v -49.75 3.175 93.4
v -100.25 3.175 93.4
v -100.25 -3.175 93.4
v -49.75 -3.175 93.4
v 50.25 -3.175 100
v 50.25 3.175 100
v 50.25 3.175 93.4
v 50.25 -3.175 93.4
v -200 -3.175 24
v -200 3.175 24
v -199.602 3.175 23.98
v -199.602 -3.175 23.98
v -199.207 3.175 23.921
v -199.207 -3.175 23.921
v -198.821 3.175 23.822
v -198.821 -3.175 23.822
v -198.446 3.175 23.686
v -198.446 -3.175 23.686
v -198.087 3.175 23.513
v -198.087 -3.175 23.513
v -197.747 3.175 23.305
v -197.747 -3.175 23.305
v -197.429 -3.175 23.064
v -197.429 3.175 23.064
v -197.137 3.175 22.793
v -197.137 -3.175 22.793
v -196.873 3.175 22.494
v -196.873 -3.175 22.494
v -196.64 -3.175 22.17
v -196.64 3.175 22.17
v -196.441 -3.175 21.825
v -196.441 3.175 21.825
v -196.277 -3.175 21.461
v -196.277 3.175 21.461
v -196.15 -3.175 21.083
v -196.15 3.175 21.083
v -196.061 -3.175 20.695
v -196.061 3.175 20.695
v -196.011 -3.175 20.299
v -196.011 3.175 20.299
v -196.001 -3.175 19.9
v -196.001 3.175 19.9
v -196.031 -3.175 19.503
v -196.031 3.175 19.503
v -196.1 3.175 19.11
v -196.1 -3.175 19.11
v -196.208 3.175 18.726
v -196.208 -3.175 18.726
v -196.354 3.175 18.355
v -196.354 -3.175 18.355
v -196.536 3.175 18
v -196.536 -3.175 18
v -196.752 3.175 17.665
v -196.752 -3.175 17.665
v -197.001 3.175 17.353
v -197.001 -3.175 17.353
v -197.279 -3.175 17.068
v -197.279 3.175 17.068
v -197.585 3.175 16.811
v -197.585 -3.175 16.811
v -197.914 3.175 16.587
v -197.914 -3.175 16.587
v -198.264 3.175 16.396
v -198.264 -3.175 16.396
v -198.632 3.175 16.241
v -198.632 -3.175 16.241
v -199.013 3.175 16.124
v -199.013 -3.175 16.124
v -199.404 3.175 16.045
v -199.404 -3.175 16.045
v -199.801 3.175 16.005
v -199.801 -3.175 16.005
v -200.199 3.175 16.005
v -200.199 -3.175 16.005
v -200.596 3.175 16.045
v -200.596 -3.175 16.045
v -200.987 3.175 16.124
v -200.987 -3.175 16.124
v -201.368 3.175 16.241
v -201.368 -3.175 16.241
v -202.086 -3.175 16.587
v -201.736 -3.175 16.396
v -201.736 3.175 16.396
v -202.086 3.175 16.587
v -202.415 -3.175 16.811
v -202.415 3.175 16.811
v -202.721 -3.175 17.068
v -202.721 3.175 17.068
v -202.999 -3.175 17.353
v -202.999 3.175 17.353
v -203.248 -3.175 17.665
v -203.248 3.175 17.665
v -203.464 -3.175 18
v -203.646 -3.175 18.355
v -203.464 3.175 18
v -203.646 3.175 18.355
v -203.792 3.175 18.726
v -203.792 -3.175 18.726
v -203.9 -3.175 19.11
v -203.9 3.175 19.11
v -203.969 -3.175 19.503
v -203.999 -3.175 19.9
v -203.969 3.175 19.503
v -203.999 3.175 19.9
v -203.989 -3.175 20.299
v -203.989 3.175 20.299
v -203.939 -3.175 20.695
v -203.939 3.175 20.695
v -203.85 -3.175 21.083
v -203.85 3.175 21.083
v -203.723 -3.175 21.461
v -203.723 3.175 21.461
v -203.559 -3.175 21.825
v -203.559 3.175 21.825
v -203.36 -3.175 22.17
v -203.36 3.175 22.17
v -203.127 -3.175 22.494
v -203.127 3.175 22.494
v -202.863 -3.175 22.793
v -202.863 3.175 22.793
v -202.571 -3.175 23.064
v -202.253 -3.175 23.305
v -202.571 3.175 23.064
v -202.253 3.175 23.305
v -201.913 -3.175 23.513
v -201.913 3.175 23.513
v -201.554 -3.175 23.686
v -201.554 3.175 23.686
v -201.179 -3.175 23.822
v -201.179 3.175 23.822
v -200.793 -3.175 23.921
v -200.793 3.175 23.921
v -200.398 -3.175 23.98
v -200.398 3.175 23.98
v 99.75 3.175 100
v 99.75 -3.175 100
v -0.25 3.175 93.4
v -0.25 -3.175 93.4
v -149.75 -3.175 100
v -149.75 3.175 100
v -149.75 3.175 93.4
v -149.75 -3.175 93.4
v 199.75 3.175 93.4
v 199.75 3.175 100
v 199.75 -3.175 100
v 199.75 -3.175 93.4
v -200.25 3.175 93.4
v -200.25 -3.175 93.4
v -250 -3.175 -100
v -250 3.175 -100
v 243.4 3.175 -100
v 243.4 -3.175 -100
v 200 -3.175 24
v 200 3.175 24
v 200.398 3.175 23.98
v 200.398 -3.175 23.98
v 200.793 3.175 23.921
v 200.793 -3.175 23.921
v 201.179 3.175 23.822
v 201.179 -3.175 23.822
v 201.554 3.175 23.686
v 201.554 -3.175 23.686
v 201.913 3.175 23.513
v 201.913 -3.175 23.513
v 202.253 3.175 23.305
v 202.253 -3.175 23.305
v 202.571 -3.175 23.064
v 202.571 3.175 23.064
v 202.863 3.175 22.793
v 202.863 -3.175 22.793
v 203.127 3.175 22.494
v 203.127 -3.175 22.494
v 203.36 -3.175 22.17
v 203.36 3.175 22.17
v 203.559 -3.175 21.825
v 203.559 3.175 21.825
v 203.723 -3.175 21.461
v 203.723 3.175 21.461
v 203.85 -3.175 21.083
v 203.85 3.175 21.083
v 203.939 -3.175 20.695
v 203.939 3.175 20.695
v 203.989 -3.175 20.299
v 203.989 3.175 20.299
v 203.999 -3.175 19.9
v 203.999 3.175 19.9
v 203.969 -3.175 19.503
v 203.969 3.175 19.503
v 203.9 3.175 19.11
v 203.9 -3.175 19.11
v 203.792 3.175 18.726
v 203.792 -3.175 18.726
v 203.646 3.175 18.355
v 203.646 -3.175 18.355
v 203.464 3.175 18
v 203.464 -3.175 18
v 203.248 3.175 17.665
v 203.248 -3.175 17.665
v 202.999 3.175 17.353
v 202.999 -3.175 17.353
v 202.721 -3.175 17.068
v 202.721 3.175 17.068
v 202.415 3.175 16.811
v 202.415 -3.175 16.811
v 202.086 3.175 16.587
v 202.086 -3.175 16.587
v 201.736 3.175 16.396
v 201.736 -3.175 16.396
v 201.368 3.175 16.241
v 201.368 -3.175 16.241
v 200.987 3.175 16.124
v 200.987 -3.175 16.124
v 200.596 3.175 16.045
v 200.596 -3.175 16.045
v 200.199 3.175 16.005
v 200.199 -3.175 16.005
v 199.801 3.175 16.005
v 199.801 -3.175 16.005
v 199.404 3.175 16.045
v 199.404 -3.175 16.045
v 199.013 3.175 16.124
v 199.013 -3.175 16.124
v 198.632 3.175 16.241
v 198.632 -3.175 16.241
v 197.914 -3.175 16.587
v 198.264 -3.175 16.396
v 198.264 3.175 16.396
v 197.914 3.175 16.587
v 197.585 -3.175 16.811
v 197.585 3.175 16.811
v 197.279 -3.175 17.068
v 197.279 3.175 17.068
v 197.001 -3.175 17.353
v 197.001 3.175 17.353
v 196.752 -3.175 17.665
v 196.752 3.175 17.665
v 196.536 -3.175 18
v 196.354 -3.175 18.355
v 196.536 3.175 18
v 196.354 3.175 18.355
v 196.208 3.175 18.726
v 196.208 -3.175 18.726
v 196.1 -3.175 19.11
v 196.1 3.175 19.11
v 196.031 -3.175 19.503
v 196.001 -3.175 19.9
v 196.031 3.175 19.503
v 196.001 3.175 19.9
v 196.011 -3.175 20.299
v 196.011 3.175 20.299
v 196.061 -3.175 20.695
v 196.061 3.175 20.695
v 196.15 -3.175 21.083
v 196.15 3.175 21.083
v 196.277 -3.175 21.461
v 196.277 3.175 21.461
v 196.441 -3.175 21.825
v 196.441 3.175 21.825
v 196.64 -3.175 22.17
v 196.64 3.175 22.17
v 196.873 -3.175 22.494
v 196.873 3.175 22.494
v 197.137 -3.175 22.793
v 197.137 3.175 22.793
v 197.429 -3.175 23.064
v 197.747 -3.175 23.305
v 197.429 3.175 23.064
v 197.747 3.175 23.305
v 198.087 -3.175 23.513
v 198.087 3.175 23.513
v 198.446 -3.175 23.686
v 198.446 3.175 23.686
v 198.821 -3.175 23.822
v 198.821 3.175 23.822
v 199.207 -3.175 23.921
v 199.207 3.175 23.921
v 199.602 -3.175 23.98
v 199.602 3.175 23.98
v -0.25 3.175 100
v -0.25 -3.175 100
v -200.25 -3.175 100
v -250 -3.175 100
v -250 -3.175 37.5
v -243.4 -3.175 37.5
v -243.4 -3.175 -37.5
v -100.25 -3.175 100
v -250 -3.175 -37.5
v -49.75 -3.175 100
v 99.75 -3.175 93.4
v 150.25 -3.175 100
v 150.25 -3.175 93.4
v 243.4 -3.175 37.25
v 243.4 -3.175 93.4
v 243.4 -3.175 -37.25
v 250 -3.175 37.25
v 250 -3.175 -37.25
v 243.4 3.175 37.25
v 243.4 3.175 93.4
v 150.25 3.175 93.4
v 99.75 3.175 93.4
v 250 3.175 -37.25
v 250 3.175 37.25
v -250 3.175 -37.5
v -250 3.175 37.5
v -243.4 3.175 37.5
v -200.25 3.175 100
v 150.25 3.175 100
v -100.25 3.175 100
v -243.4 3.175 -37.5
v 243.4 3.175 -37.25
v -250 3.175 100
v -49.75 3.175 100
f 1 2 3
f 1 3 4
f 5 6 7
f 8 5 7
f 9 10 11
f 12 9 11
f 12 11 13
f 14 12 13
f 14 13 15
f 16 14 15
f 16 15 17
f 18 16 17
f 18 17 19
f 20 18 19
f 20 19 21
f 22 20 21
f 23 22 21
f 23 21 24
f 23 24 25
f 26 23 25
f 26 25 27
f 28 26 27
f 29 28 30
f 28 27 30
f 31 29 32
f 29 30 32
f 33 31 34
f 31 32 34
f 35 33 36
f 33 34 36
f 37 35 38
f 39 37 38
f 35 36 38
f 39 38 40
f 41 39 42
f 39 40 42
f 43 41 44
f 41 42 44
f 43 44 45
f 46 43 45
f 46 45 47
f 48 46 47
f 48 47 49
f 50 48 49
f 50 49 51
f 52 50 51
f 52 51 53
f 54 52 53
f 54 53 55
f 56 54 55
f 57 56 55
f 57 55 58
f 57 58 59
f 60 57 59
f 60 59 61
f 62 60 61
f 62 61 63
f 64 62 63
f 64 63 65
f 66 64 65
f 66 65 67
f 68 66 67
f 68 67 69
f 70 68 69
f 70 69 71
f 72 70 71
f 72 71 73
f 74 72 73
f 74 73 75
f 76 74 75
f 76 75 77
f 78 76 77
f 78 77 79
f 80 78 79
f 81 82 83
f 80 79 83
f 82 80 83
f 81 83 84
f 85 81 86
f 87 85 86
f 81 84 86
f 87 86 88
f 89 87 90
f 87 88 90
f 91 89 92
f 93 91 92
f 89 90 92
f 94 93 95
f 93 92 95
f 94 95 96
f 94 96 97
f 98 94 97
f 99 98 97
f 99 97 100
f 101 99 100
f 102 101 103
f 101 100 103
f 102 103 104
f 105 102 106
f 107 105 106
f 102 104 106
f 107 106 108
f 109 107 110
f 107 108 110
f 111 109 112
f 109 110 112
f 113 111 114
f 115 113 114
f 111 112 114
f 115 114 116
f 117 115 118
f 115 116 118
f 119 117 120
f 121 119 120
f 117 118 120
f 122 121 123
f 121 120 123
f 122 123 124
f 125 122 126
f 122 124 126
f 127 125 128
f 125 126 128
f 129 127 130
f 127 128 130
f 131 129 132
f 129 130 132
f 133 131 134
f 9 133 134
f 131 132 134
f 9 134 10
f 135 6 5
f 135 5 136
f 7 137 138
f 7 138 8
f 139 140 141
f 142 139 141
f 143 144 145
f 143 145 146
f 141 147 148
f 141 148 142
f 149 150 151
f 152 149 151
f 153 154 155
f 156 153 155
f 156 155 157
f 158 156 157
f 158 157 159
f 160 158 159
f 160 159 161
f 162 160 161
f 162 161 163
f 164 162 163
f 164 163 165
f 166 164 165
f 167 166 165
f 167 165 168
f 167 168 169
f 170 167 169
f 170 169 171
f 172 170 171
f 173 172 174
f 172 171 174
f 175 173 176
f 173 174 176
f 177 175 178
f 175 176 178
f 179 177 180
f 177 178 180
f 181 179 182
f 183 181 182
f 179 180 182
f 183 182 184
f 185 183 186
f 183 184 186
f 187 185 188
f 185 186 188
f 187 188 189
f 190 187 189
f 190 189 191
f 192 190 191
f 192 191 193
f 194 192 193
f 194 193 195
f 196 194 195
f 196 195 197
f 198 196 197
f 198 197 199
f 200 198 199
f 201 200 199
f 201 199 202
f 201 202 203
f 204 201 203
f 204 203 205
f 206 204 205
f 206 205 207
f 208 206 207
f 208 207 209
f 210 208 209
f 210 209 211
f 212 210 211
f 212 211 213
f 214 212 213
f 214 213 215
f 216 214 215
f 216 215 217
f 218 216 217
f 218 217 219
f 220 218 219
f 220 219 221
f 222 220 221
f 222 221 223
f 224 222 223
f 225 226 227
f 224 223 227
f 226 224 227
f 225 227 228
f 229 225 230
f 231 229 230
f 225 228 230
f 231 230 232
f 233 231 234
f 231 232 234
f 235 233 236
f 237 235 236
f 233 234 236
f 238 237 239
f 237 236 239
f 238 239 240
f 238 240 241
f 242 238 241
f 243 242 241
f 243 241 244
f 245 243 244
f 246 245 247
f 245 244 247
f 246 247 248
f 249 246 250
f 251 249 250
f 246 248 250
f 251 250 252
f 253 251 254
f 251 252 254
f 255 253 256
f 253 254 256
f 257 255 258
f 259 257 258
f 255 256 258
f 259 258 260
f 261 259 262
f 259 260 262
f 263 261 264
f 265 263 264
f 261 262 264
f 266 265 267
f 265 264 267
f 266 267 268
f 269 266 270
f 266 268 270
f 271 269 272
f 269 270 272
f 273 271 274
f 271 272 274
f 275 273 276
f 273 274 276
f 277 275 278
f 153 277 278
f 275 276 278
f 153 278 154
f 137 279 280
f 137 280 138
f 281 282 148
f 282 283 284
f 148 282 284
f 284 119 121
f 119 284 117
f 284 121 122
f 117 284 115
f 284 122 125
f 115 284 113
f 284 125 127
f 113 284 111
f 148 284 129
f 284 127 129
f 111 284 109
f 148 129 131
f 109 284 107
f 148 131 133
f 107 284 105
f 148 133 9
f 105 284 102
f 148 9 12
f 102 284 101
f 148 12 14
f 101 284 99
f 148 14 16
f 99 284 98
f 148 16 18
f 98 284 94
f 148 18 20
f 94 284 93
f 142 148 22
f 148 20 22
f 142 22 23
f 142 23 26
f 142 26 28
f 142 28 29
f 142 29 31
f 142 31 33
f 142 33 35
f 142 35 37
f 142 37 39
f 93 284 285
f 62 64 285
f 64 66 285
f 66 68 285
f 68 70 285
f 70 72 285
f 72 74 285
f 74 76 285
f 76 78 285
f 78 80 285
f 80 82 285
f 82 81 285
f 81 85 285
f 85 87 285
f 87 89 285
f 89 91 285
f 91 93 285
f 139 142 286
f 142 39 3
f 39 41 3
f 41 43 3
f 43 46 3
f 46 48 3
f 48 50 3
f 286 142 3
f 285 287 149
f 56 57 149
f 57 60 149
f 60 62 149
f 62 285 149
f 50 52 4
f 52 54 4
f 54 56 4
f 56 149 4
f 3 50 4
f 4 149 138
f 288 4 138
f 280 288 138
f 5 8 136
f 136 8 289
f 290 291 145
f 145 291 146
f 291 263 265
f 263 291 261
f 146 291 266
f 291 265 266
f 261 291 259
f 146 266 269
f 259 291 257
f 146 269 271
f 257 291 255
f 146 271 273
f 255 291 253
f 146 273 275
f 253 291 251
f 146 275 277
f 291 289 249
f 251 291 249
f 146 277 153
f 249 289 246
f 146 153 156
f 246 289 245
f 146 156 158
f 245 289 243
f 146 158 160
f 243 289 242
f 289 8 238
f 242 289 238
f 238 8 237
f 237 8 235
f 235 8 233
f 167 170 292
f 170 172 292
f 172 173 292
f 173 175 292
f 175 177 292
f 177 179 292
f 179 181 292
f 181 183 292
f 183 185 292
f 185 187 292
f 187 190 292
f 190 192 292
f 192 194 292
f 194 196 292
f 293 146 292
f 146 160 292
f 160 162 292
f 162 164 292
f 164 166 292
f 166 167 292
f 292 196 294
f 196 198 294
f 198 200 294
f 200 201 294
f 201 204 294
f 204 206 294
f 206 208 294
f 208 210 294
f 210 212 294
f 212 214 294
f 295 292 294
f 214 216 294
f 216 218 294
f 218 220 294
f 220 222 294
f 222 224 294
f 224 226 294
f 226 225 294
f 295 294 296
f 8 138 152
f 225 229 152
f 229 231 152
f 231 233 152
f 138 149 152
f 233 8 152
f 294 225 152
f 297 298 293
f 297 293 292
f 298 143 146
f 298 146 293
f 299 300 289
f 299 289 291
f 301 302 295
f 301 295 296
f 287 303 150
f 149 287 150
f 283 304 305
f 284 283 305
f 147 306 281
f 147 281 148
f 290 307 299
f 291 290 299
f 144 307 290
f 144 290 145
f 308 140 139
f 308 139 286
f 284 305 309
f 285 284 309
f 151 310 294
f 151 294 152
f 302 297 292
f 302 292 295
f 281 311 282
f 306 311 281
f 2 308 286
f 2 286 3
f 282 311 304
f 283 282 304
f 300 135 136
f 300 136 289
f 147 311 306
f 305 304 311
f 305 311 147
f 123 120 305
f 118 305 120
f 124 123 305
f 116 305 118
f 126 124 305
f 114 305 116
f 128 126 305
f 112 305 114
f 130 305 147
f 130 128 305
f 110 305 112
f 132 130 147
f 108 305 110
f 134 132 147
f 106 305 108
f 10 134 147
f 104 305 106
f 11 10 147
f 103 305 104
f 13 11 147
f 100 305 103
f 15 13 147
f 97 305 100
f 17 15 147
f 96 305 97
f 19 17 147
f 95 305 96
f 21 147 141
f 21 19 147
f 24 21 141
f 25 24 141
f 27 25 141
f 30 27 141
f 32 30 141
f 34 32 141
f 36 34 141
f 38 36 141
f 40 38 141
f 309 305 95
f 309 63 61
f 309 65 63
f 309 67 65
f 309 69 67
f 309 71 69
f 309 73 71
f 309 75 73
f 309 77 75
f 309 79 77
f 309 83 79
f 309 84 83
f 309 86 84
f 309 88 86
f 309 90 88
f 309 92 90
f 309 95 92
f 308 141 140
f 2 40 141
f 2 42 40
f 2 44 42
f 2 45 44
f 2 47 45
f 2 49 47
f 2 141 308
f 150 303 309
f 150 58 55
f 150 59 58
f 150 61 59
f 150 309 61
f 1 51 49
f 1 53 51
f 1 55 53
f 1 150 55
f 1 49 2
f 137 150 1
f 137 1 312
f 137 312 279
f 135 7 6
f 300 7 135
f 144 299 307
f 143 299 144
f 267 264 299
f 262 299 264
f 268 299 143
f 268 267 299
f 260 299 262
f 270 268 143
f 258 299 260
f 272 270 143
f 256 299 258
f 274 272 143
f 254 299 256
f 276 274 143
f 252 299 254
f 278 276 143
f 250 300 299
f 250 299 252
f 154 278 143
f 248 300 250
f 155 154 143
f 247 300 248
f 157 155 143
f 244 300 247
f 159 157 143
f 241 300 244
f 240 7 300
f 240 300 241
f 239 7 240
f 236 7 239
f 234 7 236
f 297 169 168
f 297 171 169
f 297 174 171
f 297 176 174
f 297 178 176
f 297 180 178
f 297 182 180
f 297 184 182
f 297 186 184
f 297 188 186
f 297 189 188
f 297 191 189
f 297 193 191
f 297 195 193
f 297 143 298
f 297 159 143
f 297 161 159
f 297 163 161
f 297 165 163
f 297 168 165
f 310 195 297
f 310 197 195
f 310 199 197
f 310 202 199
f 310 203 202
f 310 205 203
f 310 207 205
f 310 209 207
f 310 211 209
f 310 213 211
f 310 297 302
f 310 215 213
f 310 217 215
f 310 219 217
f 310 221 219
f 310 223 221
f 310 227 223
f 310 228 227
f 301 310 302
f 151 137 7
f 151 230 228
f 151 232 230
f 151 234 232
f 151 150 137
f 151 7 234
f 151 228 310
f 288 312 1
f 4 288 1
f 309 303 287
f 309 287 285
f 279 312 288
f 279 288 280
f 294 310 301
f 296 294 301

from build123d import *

# Parameters (mm, degrees)
SKETCH1_W           = 500
SKETCH1_H           = 200
BOSS_EXTRUDE1_DEPTH = 3.175
SKETCH2_W           = 50.5
SKETCH2_H           = 6.6
CUT_EXTRUDE1_DEPTH  = 270.333106951
LPATTERN1_COUNT     = 5
LPATTERN1_PITCH     = 100
SKETCH3_W           = 6.6
SKETCH3_H           = 56.15
SKETCH3_H_2         = 62.75
SKETCH3_H_3         = 75
CUT_EXTRUDE2_DEPTH  = 270.333106951
SKETCH4_R           = 4
AXLE_HOLES_DEPTH    = 270.333106951


with BuildPart() as part:
    # Sketch1 → Boss-Extrude1 (new, symmetric)
    with BuildSketch(Plane(origin=(0, 0, 0), x_dir=(1, 0, 0), z_dir=(0, 1, 0))):
        Rectangle(SKETCH1_W, SKETCH1_H)
    extrude(amount=BOSS_EXTRUDE1_DEPTH, both=True)

    # Sketch2 → Cut-Extrude1 (cut, through all)
    with BuildSketch(Plane(origin=(0, 3.175, 0), x_dir=(1, 0, 0), z_dir=(0, 1, 0))):
        with Locations((-175, -96.7)):
            Rectangle(SKETCH2_W, SKETCH2_H)
    cut_extrude1 = extrude(amount=-CUT_EXTRUDE1_DEPTH, mode=Mode.SUBTRACT)

    # LPattern1: Cut-Extrude1 ×5
    with Locations(*[(i * LPATTERN1_PITCH, 0, 0) for i in range(1, LPATTERN1_COUNT)]):
        add(cut_extrude1, mode=Mode.SUBTRACT)

    # Sketch3 → Cut-Extrude2 (cut, through all)
    with BuildSketch(Plane(origin=(0, 3.175, 0), x_dir=(1, 0, 0), z_dir=(0, 1, 0))):
        with Locations((246.7, -65.325)):
            Rectangle(SKETCH3_W, SKETCH3_H)
        with Locations((246.7, 68.625)):
            Rectangle(SKETCH3_W, SKETCH3_H_2)
        with Locations((-246.7, 0)):
            Rectangle(SKETCH3_W, SKETCH3_H_3)
    extrude(amount=-CUT_EXTRUDE2_DEPTH, mode=Mode.SUBTRACT)

    # Sketch4 → Axle Holes (cut, through all)
    with BuildSketch(Plane(origin=(0, 3.175, 0), x_dir=(1, 0, 0), z_dir=(0, 1, 0))):
        with Locations(Location((-200, -20, 0), (0, 0, 270))):
            Circle(SKETCH4_R)
        with Locations(Location((200, -20, 0), (0, 0, 270))):
            Circle(SKETCH4_R)
    extrude(amount=-AXLE_HOLES_DEPTH, mode=Mode.SUBTRACT)


solid = part.part
